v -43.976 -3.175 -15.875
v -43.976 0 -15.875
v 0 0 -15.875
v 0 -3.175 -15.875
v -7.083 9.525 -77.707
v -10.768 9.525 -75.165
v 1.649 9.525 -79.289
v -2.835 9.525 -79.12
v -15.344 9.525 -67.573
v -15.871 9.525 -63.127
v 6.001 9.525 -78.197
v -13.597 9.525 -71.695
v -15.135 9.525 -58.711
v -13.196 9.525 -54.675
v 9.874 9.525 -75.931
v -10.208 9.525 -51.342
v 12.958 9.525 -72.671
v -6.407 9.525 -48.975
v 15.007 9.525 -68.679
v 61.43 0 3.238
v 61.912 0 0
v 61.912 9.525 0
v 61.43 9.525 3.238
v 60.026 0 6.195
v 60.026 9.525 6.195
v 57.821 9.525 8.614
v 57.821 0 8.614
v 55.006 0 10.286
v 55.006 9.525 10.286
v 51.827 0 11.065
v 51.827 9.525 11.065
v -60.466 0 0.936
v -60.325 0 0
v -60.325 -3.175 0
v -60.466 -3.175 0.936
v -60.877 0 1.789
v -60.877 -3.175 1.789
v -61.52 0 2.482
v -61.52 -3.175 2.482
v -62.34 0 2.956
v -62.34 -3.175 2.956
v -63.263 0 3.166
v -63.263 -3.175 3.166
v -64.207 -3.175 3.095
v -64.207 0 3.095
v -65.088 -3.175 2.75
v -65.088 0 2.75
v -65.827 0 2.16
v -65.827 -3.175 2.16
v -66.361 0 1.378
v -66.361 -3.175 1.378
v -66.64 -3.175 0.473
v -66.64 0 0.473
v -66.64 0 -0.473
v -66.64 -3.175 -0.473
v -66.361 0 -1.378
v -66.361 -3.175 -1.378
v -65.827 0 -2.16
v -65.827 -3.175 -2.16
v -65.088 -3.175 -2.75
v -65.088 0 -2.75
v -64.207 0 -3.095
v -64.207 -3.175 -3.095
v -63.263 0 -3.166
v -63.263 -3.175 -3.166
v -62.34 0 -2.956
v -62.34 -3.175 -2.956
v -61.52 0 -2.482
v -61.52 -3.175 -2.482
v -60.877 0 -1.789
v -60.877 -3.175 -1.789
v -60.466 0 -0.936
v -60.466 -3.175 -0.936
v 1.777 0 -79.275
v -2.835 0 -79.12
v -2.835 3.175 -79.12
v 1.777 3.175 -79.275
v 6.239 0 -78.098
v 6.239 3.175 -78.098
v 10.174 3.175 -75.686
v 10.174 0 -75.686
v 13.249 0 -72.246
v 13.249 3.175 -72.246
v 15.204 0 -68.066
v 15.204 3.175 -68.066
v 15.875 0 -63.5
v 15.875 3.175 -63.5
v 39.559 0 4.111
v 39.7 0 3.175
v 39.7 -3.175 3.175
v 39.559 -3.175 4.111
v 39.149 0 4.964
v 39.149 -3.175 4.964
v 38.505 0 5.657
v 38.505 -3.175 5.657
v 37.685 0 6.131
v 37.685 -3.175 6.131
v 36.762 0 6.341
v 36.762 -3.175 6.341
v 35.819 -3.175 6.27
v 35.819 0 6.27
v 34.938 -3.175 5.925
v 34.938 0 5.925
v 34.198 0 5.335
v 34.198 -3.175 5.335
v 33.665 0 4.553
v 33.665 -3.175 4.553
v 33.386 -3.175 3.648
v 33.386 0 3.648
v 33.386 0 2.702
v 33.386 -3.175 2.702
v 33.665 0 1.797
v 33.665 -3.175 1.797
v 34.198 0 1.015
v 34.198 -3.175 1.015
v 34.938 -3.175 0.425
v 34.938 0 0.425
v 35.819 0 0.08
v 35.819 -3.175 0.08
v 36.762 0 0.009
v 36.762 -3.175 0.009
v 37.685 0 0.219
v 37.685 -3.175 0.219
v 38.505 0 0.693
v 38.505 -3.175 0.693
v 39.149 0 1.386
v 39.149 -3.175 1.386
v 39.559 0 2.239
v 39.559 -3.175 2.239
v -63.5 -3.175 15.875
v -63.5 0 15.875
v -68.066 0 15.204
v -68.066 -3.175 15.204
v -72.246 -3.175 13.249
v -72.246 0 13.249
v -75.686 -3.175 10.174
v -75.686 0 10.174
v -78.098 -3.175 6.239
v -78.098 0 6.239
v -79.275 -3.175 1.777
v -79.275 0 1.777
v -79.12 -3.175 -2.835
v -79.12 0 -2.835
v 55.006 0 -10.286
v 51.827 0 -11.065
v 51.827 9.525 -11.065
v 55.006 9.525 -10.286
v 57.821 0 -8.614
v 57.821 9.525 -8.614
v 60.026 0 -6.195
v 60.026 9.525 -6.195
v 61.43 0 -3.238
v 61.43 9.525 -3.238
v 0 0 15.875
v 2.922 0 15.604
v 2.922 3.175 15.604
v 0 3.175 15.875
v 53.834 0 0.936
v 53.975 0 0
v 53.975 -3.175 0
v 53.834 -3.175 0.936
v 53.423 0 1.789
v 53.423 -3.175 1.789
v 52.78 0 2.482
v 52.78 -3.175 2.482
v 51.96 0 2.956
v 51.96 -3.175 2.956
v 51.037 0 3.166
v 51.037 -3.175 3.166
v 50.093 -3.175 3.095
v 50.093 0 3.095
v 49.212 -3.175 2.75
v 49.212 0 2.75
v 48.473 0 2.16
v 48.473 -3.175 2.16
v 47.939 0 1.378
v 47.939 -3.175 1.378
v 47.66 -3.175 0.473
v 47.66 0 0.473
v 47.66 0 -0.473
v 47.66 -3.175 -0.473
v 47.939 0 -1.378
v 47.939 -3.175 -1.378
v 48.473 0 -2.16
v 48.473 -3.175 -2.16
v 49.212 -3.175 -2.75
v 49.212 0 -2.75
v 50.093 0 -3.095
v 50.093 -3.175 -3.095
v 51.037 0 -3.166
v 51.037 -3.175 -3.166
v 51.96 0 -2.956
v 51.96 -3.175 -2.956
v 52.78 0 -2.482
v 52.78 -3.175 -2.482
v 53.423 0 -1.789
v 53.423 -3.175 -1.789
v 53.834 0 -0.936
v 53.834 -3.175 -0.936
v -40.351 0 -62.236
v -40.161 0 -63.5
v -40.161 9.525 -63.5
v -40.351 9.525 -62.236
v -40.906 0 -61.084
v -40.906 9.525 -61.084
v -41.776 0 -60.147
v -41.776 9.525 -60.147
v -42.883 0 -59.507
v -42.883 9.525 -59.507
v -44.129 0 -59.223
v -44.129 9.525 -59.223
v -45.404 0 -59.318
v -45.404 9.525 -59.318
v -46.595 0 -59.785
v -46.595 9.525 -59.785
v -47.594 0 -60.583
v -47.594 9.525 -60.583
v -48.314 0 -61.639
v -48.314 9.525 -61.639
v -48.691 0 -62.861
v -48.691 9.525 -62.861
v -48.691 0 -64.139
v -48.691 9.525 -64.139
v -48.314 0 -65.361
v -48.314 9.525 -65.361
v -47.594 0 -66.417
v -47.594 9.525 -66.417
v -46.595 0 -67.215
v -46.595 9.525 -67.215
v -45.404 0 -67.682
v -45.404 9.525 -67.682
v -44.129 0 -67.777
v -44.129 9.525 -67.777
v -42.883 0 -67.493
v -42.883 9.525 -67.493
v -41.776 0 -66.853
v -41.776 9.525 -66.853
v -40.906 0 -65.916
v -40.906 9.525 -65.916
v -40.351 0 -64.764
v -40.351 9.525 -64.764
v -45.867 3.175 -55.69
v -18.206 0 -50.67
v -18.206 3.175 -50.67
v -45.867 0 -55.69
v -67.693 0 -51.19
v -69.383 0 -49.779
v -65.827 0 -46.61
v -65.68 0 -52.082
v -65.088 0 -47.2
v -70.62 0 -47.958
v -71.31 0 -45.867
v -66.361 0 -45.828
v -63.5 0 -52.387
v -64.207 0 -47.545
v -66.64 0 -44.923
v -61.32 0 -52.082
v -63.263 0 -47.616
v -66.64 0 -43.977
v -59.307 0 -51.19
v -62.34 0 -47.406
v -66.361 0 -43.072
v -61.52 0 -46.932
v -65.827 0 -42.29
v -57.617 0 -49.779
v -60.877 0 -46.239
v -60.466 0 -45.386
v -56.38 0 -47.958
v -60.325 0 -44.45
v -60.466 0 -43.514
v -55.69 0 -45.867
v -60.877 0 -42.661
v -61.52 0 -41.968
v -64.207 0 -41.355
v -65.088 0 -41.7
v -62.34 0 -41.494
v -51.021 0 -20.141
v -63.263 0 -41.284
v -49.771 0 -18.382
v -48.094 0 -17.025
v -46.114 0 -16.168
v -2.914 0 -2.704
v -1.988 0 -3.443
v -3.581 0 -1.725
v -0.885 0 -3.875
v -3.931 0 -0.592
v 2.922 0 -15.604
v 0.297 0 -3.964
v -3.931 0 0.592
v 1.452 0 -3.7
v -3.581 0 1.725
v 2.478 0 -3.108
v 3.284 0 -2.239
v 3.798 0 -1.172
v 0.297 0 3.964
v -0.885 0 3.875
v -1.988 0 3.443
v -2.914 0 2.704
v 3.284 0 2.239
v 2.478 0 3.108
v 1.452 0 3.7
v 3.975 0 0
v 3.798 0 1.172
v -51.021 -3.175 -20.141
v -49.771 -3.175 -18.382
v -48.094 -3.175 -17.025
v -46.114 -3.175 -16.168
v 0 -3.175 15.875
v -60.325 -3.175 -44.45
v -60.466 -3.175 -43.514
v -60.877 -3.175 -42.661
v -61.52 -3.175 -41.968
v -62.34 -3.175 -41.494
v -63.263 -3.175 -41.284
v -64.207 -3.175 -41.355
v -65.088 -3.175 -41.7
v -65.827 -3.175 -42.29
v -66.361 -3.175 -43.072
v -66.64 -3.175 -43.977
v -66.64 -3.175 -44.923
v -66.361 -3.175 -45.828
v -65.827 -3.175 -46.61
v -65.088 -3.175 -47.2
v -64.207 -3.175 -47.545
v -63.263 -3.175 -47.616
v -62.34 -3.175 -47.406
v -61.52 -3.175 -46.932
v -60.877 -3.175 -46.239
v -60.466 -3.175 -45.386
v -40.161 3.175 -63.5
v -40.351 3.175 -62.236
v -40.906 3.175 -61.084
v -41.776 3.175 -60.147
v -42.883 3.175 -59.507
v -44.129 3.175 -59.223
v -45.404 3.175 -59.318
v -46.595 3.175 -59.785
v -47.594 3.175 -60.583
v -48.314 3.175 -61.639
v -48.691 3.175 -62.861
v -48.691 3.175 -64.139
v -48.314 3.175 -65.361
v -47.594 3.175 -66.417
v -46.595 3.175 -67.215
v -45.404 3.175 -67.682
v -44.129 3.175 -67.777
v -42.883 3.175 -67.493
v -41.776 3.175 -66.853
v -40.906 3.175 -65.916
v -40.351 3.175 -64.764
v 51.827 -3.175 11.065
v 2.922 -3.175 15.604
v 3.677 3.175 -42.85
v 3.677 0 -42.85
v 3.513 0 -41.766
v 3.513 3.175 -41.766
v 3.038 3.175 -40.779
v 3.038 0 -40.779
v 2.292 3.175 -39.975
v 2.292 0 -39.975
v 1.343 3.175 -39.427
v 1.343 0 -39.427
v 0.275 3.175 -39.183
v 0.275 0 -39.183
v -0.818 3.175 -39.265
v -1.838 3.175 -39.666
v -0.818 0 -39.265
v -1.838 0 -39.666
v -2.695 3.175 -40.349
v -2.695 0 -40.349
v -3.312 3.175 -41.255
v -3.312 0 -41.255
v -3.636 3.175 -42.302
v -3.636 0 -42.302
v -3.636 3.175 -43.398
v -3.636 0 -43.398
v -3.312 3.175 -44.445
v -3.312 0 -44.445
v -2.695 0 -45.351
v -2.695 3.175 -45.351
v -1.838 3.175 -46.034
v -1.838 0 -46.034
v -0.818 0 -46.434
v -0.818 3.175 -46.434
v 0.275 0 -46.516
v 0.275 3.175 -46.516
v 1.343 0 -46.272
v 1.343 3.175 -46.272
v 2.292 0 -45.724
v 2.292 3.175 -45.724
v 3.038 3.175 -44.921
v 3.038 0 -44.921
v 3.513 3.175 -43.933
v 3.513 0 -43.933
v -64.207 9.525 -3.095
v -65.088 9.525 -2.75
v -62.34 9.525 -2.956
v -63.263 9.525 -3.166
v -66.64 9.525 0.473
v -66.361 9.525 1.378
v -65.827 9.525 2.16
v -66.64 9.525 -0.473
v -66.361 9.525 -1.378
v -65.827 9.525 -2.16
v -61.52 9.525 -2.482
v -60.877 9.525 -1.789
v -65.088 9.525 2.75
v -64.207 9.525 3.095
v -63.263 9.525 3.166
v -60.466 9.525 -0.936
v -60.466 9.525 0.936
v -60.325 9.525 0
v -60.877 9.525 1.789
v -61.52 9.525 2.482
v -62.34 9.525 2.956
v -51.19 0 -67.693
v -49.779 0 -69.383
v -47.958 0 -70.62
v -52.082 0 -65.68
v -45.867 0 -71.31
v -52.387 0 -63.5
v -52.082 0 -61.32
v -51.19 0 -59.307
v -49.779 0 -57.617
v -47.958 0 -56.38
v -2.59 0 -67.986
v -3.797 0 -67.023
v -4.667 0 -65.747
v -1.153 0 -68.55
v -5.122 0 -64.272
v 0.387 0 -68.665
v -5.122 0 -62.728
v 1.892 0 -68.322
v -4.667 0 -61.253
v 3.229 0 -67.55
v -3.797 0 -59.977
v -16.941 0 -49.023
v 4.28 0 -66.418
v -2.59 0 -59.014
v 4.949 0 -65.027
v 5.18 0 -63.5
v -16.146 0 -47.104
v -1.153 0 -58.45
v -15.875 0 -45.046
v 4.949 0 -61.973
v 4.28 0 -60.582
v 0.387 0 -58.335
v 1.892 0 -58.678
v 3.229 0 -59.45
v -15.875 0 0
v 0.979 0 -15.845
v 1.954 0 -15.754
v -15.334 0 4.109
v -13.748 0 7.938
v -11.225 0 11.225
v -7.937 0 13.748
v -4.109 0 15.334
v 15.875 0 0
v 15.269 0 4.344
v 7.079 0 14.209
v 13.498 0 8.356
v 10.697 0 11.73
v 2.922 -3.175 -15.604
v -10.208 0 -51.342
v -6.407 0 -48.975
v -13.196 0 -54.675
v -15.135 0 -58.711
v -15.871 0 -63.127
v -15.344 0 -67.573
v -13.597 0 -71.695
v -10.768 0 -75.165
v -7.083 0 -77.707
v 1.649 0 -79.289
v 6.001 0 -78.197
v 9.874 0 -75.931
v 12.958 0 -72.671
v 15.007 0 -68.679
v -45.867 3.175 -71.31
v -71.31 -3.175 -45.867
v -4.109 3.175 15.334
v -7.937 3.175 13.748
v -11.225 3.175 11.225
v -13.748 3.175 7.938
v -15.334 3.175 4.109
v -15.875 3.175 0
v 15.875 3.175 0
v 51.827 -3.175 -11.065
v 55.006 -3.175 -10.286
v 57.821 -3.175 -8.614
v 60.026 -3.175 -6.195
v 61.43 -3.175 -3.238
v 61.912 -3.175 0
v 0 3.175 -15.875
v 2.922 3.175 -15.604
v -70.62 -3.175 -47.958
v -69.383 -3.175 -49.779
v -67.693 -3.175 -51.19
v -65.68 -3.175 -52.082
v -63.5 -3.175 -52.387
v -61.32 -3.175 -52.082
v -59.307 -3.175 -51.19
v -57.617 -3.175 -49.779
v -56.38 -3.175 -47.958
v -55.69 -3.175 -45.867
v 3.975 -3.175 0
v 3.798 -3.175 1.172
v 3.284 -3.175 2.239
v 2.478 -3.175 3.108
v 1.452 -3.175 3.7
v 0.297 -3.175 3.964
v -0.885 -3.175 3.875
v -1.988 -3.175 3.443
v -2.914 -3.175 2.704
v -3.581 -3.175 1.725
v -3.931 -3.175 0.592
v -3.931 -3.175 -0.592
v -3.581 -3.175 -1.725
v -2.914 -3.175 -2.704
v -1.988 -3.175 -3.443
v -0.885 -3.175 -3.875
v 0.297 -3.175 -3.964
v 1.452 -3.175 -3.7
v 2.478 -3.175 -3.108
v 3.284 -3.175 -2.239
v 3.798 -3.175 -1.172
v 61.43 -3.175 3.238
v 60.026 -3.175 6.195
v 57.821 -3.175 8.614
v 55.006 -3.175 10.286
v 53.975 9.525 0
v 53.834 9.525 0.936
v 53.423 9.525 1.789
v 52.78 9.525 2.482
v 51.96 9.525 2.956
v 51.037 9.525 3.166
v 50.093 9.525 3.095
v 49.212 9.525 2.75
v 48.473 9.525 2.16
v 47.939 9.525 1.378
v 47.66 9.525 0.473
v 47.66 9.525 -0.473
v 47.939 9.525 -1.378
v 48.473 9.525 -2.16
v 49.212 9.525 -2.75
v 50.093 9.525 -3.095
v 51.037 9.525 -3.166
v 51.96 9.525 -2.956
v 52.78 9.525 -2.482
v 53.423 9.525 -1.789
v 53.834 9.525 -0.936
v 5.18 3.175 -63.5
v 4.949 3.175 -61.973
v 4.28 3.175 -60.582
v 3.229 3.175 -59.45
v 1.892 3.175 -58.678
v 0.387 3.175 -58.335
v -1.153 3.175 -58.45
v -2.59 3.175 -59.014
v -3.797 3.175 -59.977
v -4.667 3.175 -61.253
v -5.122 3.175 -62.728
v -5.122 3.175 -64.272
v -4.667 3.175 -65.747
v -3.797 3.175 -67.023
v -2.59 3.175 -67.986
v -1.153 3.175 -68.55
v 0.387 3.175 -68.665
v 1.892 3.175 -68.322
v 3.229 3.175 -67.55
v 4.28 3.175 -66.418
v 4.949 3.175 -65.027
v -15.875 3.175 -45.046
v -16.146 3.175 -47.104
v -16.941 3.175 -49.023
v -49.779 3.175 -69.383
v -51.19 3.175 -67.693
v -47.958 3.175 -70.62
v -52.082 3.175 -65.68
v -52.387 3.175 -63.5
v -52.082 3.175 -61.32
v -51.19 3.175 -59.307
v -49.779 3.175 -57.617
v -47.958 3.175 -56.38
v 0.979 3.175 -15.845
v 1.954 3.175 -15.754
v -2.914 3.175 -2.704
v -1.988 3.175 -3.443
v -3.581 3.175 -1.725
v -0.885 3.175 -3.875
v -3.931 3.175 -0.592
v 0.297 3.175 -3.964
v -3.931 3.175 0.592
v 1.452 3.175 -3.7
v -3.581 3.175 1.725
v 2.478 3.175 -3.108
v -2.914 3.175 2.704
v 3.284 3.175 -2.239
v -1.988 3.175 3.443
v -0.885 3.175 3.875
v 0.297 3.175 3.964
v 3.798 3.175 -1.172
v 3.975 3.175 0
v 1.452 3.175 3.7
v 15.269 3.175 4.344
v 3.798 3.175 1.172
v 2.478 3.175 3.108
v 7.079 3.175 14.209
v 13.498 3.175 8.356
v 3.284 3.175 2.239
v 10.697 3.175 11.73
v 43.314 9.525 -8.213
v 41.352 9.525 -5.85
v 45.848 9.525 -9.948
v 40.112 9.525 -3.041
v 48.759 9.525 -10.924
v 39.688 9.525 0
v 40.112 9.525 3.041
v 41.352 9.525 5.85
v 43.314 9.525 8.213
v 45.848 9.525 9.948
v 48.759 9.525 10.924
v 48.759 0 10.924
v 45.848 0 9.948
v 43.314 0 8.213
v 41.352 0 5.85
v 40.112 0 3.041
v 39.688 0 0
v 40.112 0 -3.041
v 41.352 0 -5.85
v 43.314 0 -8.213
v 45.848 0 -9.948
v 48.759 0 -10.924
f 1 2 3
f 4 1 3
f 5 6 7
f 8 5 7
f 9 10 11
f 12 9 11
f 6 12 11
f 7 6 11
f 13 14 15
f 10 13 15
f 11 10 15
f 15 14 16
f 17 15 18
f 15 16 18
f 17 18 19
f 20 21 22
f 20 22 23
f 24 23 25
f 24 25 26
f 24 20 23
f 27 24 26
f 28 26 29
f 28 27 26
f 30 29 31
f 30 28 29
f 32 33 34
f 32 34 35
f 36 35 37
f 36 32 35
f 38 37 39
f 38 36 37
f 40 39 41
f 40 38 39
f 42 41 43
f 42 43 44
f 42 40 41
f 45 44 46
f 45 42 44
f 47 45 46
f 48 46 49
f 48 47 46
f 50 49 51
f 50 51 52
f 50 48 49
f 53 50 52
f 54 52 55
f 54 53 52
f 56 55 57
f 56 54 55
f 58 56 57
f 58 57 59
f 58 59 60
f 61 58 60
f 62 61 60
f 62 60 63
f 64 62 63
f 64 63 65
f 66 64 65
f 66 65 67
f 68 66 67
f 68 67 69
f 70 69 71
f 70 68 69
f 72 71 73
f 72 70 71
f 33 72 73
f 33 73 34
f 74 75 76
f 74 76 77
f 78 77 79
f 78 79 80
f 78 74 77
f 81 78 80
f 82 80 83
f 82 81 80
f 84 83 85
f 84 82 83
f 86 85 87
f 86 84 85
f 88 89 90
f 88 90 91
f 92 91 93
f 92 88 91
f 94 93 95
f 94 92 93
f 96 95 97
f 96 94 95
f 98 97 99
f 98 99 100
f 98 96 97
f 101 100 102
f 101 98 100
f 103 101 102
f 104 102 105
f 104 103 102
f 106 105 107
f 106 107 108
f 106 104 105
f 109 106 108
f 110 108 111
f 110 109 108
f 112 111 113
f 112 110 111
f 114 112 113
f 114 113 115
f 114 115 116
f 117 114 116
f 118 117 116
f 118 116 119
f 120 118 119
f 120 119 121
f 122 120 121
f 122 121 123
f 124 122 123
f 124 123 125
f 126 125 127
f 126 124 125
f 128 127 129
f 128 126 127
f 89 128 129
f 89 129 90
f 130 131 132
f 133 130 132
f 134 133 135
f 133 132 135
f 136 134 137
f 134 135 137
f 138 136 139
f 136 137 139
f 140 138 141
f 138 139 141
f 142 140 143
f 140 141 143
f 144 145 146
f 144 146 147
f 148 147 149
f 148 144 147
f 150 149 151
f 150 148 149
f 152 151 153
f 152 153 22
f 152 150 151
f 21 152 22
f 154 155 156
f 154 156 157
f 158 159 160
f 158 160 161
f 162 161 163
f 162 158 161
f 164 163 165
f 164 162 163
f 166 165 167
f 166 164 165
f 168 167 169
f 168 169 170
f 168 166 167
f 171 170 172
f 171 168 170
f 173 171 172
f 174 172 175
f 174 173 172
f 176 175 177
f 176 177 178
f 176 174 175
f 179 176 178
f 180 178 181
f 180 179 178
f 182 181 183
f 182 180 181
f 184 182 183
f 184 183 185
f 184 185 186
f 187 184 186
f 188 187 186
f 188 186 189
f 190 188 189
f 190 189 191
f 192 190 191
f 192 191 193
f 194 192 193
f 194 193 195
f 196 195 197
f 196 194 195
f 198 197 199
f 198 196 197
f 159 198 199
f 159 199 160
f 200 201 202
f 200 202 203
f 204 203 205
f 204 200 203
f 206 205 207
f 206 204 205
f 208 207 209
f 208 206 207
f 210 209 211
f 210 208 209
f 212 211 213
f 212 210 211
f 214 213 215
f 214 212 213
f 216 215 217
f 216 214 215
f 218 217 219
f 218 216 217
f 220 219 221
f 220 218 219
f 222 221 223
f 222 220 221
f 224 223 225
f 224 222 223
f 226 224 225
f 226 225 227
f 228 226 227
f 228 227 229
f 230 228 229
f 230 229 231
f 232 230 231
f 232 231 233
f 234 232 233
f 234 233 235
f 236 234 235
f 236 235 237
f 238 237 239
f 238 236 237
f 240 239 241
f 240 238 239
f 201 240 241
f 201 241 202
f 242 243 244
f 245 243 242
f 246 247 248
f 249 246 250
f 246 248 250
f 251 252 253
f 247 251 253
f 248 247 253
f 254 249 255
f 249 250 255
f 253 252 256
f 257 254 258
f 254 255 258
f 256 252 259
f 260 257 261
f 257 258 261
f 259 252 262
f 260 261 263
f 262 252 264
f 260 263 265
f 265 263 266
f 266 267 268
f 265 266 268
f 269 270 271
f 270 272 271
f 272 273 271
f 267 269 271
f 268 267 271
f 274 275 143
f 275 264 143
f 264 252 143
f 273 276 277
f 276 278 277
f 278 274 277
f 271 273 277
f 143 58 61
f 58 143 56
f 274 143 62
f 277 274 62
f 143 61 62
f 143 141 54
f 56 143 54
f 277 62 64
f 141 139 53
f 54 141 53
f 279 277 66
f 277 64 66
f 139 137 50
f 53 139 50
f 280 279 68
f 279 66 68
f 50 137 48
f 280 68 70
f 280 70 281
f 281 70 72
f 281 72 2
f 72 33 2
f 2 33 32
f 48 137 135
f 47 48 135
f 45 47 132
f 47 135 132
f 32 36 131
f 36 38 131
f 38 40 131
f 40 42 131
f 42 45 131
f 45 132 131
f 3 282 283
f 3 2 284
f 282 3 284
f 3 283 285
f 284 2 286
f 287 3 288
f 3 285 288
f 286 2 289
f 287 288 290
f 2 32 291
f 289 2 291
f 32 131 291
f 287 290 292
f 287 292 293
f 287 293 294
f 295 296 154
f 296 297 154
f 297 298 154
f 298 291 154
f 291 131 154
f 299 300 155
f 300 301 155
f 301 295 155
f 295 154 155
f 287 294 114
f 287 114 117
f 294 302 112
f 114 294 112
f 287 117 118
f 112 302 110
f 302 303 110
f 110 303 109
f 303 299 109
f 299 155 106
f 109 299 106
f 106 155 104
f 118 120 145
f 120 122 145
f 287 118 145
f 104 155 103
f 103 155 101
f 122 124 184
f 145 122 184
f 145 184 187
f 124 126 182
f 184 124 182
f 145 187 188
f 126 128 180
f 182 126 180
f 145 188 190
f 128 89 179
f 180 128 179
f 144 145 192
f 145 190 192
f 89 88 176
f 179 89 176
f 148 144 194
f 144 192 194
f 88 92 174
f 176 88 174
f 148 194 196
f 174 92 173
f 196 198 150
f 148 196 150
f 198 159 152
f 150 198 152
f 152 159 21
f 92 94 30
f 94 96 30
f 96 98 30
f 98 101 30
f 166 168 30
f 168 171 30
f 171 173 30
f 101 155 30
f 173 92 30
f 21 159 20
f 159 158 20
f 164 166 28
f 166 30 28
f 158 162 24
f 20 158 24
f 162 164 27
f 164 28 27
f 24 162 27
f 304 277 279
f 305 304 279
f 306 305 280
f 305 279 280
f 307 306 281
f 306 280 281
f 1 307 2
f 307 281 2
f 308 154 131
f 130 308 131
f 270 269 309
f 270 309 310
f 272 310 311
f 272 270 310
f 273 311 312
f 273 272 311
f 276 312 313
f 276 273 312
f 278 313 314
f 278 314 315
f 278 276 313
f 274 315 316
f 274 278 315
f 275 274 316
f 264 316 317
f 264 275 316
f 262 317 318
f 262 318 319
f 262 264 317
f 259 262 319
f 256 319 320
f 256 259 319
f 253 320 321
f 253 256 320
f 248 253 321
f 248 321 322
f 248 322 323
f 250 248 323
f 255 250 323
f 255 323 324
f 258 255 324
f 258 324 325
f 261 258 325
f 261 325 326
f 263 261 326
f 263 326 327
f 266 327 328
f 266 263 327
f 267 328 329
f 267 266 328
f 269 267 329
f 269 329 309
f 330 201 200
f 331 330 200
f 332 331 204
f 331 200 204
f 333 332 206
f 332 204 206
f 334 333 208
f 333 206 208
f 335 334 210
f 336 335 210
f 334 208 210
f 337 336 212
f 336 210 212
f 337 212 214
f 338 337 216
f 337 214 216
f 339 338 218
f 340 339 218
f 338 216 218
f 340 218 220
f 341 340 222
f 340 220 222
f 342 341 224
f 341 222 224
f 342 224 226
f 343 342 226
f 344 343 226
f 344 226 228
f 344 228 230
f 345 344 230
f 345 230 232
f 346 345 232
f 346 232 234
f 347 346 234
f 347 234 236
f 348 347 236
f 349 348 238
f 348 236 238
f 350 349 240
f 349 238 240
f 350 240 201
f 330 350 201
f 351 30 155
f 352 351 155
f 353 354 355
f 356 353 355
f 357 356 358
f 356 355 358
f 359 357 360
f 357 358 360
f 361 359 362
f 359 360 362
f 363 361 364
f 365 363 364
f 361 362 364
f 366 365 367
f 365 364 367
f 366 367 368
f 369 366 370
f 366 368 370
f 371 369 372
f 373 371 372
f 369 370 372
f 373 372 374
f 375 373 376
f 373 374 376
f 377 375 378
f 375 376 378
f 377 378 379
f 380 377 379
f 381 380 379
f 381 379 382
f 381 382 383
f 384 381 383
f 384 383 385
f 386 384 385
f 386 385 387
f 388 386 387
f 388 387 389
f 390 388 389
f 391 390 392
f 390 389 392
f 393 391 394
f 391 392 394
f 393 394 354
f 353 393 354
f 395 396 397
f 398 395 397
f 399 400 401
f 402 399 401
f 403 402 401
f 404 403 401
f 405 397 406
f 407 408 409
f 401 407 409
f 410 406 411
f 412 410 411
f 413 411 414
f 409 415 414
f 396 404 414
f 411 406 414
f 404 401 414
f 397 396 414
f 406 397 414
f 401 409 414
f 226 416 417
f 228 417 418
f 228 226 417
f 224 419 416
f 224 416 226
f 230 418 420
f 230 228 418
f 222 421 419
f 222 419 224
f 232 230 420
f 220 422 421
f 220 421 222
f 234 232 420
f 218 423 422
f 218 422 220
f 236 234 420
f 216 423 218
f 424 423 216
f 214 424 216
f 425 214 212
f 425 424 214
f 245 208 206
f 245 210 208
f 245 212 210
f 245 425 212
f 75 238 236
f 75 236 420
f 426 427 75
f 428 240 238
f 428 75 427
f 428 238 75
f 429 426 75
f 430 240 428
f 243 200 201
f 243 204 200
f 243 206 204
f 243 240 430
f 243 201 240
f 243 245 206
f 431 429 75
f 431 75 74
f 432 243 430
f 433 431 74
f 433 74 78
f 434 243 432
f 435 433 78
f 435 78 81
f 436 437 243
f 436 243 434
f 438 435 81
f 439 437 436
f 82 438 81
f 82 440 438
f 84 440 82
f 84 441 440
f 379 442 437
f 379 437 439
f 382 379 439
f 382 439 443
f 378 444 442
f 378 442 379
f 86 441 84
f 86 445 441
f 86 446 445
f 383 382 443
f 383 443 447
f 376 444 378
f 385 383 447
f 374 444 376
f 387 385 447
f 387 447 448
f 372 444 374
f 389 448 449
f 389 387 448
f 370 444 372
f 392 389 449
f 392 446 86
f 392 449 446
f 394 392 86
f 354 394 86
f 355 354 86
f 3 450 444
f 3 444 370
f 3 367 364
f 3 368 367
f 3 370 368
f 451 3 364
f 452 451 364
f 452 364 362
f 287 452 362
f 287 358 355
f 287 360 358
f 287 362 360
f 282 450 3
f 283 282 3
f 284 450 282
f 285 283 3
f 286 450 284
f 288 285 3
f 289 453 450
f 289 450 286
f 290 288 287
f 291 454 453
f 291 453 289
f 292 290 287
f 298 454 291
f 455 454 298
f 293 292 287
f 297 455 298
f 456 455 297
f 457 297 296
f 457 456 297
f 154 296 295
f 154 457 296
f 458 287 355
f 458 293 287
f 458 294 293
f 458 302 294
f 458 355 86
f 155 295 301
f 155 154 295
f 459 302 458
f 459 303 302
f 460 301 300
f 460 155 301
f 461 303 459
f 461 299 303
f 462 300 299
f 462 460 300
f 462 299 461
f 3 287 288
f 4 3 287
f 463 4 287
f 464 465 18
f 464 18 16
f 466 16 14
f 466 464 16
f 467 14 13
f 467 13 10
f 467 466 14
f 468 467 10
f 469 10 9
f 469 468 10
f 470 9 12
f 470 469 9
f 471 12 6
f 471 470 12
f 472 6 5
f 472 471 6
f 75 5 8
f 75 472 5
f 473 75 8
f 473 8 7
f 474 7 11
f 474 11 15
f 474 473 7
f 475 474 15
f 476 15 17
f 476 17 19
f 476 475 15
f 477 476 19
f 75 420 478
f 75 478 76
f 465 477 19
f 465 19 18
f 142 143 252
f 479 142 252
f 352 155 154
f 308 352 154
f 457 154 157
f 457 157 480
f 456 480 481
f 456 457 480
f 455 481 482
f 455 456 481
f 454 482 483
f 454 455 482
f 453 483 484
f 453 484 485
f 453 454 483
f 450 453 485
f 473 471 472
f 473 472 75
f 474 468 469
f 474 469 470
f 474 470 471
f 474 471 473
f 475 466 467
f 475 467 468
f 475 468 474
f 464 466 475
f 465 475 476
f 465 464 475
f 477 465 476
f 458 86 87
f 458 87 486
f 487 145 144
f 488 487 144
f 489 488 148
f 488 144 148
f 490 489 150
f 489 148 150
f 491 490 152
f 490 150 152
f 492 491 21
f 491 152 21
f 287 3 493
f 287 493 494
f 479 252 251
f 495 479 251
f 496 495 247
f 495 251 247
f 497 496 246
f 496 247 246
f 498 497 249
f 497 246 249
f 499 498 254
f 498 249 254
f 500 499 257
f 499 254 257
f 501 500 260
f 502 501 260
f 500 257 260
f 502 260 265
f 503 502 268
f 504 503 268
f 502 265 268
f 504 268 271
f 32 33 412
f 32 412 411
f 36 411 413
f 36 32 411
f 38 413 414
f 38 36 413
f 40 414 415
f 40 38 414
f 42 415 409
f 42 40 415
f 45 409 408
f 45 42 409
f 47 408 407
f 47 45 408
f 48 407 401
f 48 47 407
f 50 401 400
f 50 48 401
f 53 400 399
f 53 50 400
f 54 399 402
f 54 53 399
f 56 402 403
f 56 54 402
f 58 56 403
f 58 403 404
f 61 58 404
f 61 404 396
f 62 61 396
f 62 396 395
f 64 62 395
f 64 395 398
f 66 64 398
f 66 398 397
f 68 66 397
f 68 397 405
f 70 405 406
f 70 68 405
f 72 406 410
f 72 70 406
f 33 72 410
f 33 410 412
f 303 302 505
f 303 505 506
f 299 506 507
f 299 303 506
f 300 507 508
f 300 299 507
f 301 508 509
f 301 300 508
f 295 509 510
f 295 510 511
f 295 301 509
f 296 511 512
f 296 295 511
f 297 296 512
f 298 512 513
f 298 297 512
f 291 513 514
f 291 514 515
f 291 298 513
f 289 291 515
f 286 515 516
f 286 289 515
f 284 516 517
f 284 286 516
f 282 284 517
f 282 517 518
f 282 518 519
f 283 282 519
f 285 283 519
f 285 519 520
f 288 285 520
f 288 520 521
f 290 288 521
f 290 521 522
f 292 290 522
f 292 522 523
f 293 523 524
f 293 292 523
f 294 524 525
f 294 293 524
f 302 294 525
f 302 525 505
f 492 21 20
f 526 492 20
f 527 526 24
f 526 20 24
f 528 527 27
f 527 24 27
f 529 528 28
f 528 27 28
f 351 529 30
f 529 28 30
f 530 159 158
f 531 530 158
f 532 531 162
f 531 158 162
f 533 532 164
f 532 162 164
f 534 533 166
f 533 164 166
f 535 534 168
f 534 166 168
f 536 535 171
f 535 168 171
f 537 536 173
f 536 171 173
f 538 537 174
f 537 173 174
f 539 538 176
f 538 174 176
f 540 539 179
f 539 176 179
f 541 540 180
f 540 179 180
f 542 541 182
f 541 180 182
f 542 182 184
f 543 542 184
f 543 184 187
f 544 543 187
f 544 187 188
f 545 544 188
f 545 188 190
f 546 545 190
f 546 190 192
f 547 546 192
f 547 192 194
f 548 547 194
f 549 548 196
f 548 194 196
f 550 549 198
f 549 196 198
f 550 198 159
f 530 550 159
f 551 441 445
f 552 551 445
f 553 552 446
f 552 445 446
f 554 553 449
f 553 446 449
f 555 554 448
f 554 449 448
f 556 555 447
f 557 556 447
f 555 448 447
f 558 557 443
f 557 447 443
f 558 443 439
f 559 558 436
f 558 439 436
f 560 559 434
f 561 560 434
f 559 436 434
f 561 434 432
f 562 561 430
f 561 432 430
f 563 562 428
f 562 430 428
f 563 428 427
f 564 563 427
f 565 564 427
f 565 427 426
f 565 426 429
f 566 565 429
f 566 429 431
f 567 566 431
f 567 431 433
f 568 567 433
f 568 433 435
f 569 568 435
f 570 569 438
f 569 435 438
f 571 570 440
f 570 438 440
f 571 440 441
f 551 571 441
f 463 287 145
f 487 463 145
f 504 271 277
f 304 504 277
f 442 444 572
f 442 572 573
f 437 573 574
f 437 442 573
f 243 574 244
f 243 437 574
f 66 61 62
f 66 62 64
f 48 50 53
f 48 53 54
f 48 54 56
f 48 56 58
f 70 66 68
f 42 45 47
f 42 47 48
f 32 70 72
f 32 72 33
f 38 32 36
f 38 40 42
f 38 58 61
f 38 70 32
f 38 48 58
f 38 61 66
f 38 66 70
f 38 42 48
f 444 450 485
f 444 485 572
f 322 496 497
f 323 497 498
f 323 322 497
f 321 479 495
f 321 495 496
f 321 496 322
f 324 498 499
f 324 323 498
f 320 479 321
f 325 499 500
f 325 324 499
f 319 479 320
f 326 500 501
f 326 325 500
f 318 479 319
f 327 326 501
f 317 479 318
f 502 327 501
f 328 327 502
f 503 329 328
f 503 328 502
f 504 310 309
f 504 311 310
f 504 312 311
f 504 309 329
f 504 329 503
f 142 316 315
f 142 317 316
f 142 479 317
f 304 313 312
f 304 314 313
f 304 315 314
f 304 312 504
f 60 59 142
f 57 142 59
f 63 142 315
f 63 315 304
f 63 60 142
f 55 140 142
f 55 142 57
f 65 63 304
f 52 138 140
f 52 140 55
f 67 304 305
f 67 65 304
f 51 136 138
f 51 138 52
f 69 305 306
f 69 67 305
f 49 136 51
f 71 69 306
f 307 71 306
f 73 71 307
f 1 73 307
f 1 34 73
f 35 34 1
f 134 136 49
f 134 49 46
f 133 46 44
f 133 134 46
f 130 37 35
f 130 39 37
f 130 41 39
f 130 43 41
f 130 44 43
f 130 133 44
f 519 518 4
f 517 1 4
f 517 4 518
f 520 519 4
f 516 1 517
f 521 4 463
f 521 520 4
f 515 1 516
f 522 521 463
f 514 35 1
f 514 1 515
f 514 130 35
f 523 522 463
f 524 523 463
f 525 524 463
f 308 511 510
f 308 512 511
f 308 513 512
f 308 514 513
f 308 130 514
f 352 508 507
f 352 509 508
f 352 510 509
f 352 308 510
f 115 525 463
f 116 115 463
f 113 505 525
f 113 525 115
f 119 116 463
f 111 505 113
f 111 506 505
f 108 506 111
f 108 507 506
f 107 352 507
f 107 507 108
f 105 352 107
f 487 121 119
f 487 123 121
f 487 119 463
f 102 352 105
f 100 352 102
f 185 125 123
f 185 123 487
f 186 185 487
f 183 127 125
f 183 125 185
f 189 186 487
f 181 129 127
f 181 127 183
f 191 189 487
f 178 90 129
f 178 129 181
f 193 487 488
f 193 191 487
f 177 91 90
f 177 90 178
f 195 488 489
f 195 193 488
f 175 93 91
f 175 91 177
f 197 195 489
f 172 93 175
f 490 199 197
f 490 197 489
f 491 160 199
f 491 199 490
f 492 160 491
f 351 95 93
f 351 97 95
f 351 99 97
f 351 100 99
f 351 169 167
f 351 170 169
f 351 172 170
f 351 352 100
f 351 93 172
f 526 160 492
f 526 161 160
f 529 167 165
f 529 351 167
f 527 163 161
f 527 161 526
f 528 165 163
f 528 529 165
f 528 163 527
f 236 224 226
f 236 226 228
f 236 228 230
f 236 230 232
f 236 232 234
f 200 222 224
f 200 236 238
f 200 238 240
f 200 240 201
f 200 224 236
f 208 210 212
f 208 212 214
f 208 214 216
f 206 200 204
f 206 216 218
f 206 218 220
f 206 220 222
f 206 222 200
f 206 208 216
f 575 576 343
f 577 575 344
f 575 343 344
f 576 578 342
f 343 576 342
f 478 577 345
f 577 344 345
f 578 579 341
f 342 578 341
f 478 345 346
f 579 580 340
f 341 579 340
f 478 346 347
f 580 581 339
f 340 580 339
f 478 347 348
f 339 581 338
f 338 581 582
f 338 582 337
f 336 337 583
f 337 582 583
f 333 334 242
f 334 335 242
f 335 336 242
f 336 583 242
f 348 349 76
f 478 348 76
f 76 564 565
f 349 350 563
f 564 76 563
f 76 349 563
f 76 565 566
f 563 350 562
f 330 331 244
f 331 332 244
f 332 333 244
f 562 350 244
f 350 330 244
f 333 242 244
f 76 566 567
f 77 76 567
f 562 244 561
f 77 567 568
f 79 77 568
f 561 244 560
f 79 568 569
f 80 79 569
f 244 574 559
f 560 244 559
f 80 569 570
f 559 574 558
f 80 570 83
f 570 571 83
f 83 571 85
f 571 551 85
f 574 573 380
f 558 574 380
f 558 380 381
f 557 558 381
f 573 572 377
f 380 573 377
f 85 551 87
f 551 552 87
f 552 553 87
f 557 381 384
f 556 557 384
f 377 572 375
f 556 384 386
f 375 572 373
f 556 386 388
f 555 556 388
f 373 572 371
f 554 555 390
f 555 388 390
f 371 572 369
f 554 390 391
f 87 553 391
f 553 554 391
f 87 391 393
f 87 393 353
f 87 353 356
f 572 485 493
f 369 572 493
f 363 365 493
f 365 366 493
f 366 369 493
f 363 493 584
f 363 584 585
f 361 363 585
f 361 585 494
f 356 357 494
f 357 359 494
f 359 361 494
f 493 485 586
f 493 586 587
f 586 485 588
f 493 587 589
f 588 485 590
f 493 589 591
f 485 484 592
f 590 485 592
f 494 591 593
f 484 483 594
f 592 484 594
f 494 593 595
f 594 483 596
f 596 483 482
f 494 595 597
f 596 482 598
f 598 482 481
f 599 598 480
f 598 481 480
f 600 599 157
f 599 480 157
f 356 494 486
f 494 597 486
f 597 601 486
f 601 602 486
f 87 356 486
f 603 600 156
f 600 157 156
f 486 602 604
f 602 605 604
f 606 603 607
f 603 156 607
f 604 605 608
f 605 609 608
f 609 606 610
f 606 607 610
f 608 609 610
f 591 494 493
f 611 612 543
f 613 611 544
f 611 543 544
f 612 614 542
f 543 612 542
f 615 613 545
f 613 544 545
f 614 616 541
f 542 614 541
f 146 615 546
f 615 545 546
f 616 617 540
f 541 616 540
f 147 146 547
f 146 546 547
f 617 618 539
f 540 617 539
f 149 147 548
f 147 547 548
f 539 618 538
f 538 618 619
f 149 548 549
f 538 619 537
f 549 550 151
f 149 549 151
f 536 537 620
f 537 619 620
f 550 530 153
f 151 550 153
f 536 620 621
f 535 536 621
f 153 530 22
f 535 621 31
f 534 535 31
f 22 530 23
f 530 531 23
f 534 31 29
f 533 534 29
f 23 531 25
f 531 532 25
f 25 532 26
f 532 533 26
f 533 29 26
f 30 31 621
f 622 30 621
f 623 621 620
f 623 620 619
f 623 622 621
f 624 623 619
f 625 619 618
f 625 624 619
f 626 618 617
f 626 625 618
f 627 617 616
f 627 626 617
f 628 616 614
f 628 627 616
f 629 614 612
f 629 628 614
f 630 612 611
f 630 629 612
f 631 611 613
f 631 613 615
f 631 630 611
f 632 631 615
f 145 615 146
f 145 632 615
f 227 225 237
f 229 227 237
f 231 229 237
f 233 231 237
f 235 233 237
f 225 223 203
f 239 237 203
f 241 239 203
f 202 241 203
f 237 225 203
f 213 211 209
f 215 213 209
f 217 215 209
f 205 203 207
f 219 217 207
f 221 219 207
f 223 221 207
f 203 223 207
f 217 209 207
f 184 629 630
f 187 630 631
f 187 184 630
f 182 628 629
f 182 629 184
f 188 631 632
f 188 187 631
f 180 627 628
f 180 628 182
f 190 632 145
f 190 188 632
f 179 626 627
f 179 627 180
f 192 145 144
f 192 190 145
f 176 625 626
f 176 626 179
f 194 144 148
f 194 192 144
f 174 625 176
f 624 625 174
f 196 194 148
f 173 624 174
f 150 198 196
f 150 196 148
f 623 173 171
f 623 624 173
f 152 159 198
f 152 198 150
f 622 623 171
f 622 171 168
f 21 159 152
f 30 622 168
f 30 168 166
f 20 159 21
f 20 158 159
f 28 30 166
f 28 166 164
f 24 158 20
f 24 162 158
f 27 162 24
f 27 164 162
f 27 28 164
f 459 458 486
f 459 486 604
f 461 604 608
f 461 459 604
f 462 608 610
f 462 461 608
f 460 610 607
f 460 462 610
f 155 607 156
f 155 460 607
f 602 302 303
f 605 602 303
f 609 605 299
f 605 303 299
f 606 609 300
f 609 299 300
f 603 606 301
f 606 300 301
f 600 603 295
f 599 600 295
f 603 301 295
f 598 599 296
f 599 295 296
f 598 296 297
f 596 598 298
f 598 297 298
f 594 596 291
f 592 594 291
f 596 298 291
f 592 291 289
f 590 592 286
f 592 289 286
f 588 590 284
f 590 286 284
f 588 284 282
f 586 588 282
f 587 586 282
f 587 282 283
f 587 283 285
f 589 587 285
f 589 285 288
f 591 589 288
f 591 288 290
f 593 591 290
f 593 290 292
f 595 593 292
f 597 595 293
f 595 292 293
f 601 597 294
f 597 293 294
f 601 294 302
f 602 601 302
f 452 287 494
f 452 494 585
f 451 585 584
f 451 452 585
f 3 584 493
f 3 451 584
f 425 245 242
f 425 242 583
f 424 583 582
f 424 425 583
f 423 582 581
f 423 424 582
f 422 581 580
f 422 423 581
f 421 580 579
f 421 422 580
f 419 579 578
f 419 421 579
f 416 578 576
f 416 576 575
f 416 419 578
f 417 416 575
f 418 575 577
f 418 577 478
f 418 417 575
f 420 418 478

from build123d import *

# Parameters (mm, degrees)
F0_R     = 3.175
F0_R_2   = 3.9751
F2_DEPTH = 3.175
F1_R     = 4.2892452459
F1_R_2   = 3.6765959768
F1_R_3   = 5.1795527056
F3_DEPTH = 3.175
F6_DEPTH = 9.525


with BuildPart() as f2:
    # F0 (on Front) → F2 (new body)
    with BuildSketch(Plane.XZ):
        with BuildLine():
            ThreePointArc((-63.5, 15.875), (-52.2746798487, 11.2253201513), (-47.625, 0))
            ThreePointArc((-47.625, 0), (-62.076859197, -15.8110814069), (-79.1198403471, -2.8348214286))
            Line((-79.1198403471, -2.8348214286), (-71.3099201735, -45.8674107143))
            ThreePointArc((-71.3099201735, -45.8674107143), (-64.2115704015, -36.5444592966), (-55.5625, -44.45))
            ThreePointArc((-55.5625, -44.45), (-55.5944592966, -45.1615704015), (-55.6900798265, -45.8674107143))
            Line((-55.6900798265, -45.8674107143), (-51.0209685693, -20.140650057))
            ThreePointArc((-51.0209685693, -20.140650057), (-48.093941688, -17.0245166153), (-43.976128489, -15.875))
            Line((-43.976128489, -15.875), (0, -15.875))
            ThreePointArc((0, -15.875), (-15.875, 0), (0, 15.875))
            Line((0, 15.875), (-63.5, 15.875))
        make_face()
        with BuildLine():
            Line((51.8269366371, 11.0649472386), (2.9215490166, 15.6038513305))
            ThreePointArc((2.9215490166, 15.6038513305), (12.2146472655, 10.1399219514), (15.875, 0))
            ThreePointArc((15.875, 0), (12.2146472655, -10.1399219514), (2.9215490166, -15.6038513305))
            Line((2.9215490166, -15.6038513305), (51.8269366371, -11.0649472386))
            ThreePointArc((51.8269366371, -11.0649472386), (39.6875, 0), (51.8269366371, 11.0649472386))
        make_face()
        with Locations((36.5252, 3.175)):
            Circle(F0_R, mode=Mode.SUBTRACT)
        with BuildLine():
            Line((2.9215490166, 15.6038513305), (0, 15.875))
            ThreePointArc((0, 15.875), (-15.875, 0), (0, -15.875))
            Line((0, -15.875), (2.9215490166, -15.6038513305))
            ThreePointArc((2.9215490166, -15.6038513305), (12.2146472655, -10.1399219514), (15.875, 0))
            ThreePointArc((15.875, 0), (12.2146472655, 10.1399219514), (2.9215490166, 15.6038513305))
        make_face()
        Circle(F0_R_2, mode=Mode.SUBTRACT)
        with BuildLine():
            ThreePointArc((61.9125, 0), (59.0127793599, 7.4858474093), (51.8269366371, 11.0649472386))
            ThreePointArc((51.8269366371, 11.0649472386), (39.6875, 0), (51.8269366371, -11.0649472386))
            ThreePointArc((51.8269366371, -11.0649472386), (59.0127793599, -7.4858474093), (61.9125, 0))
        make_face()
        with Locations((50.8, 0)):
            Circle(F0_R, mode=Mode.SUBTRACT)
        with BuildLine():
            ThreePointArc((-79.1198403471, -2.8348214286), (-62.076859197, -15.8110814069), (-47.625, 0))
            ThreePointArc((-47.625, 0), (-52.2746798487, 11.2253201513), (-63.5, 15.875))
            ThreePointArc((-63.5, 15.875), (-75.6864353931, 10.1738103683), (-79.1198403471, -2.8348214286))
        make_face()
        with Locations((-63.5, 0)):
            Circle(F0_R, mode=Mode.SUBTRACT)
        with BuildLine():
            ThreePointArc((-55.5625, -44.45), (-64.2115704015, -36.5444592966), (-71.3099201735, -45.8674107143))
            ThreePointArc((-71.3099201735, -45.8674107143), (-63.5, -52.3875), (-55.6900798265, -45.8674107143))
            ThreePointArc((-55.6900798265, -45.8674107143), (-55.5944592966, -45.1615704015), (-55.5625, -44.45))
        make_face()
        with Locations((-63.5, -44.45)):
            Circle(F0_R, mode=Mode.SUBTRACT)
    extrude(amount=F2_DEPTH)


with BuildPart() as f3:
    # F1 (on Front) → F3 (new body)
    with BuildSketch(Plane.XZ):
        with BuildLine():
            ThreePointArc((-45.8674107143, -55.6900798265), (-52.3875, -63.5), (-45.8674107143, -71.3099201735))
            ThreePointArc((-45.8674107143, -71.3099201735), (-39.3630948158, -69.5932176965), (-36.5125, -63.5))
            ThreePointArc((-36.5125, -63.5), (-39.3630948158, -57.4067823035), (-45.8674107143, -55.6900798265))
        make_face()
        with Locations((-44.45, -63.5)):
            Circle(F1_R, mode=Mode.SUBTRACT)
        with BuildLine():
            ThreePointArc((-2.8348214286, -79.1198403471), (-10.1738103683, -51.3135646069), (15.875, -63.5))
            Line((15.875, -63.5), (15.875, 0))
            ThreePointArc((15.875, 0), (0, -15.875), (-15.875, 0))
            Line((-15.875, 0), (-15.875, -45.0455299837))
            ThreePointArc((-15.875, -45.0455299837), (-16.4809135011, -48.0897270637), (-18.2062962849, -50.6699056006))
            Line((-18.2062962849, -50.6699056006), (-45.8674107143, -55.6900798265))
            ThreePointArc((-45.8674107143, -55.6900798265), (-39.3630948158, -57.4067823035), (-36.5125, -63.5))
            ThreePointArc((-36.5125, -63.5), (-39.3630948158, -69.5932176965), (-45.8674107143, -71.3099201735))
            Line((-45.8674107143, -71.3099201735), (-2.8348214286, -79.1198403471))
        make_face()
        with Locations((0, -42.8498)):
            Circle(F1_R_2, mode=Mode.SUBTRACT)
        with BuildLine():
            ThreePointArc((-2.8348214286, -79.1198403471), (10.1738103683, -75.6864353931), (15.875, -63.5))
            ThreePointArc((15.875, -63.5), (-10.1738103683, -51.3135646069), (-2.8348214286, -79.1198403471))
        make_face()
        with Locations((0, -63.5)):
            Circle(F1_R_3, mode=Mode.SUBTRACT)
    extrude(amount=-F3_DEPTH)

    # F0 (on Front) → F3, piece 2 (join)
    with BuildSketch(Plane.XZ):
        with BuildLine():
            Line((2.9215490166, 15.6038513305), (0, 15.875))
            ThreePointArc((0, 15.875), (-15.875, 0), (0, -15.875))
            Line((0, -15.875), (2.9215490166, -15.6038513305))
            ThreePointArc((2.9215490166, -15.6038513305), (12.2146472655, -10.1399219514), (15.875, 0))
            ThreePointArc((15.875, 0), (12.2146472655, 10.1399219514), (2.9215490166, 15.6038513305))
        make_face()
        Circle(F0_R_2, mode=Mode.SUBTRACT)
    extrude(amount=-F3_DEPTH)


with BuildPart() as f6:
    # F4 (on face) → F6 (new body, through all)
    with BuildSketch(Plane.XZ):
        with BuildLine():
            Line((15.0065312392, -68.678768692), (-6.4073053166, -48.9754668378))
            ThreePointArc((-6.4073053166, -48.9754668378), (-15.7646769793, -65.3683106647), (-2.8348214286, -79.1198403471))
            ThreePointArc((-2.8348214286, -79.1198403471), (8.0182058002, -77.2012408469), (15.0065312392, -68.678768692))
        make_face()
    extrude(amount=-F6_DEPTH)


with BuildPart() as f6b:
    # F1 (on Front) → F6, piece 2 (new body, through all)
    with BuildSketch(Plane.XZ):
        with Locations((-44.45, -63.5)):
            Circle(F1_R)
    extrude(amount=-F6_DEPTH)


with BuildPart() as f6c:
    # F0 (on Front) → F6, piece 3 (new body, through all)
    with BuildSketch(Plane.XZ):
        with Locations((-63.5, 0)):
            Circle(F0_R)
    extrude(amount=-F6_DEPTH)


with BuildPart() as f6d:
    # F0 (on Front) → F6, piece 4 (new body, through all)
    with BuildSketch(Plane.XZ):
        with BuildLine():
            ThreePointArc((61.9125, 0), (59.0127793599, 7.4858474093), (51.8269366371, 11.0649472386))
            ThreePointArc((51.8269366371, 11.0649472386), (39.6875, 0), (51.8269366371, -11.0649472386))
            ThreePointArc((51.8269366371, -11.0649472386), (59.0127793599, -7.4858474093), (61.9125, 0))
        make_face()
        with Locations((50.8, 0)):
            Circle(F0_R, mode=Mode.SUBTRACT)
    extrude(amount=-F6_DEPTH)


solid = Compound([f2.part, f3.part, f6.part, f6b.part, f6c.part, f6d.part])
